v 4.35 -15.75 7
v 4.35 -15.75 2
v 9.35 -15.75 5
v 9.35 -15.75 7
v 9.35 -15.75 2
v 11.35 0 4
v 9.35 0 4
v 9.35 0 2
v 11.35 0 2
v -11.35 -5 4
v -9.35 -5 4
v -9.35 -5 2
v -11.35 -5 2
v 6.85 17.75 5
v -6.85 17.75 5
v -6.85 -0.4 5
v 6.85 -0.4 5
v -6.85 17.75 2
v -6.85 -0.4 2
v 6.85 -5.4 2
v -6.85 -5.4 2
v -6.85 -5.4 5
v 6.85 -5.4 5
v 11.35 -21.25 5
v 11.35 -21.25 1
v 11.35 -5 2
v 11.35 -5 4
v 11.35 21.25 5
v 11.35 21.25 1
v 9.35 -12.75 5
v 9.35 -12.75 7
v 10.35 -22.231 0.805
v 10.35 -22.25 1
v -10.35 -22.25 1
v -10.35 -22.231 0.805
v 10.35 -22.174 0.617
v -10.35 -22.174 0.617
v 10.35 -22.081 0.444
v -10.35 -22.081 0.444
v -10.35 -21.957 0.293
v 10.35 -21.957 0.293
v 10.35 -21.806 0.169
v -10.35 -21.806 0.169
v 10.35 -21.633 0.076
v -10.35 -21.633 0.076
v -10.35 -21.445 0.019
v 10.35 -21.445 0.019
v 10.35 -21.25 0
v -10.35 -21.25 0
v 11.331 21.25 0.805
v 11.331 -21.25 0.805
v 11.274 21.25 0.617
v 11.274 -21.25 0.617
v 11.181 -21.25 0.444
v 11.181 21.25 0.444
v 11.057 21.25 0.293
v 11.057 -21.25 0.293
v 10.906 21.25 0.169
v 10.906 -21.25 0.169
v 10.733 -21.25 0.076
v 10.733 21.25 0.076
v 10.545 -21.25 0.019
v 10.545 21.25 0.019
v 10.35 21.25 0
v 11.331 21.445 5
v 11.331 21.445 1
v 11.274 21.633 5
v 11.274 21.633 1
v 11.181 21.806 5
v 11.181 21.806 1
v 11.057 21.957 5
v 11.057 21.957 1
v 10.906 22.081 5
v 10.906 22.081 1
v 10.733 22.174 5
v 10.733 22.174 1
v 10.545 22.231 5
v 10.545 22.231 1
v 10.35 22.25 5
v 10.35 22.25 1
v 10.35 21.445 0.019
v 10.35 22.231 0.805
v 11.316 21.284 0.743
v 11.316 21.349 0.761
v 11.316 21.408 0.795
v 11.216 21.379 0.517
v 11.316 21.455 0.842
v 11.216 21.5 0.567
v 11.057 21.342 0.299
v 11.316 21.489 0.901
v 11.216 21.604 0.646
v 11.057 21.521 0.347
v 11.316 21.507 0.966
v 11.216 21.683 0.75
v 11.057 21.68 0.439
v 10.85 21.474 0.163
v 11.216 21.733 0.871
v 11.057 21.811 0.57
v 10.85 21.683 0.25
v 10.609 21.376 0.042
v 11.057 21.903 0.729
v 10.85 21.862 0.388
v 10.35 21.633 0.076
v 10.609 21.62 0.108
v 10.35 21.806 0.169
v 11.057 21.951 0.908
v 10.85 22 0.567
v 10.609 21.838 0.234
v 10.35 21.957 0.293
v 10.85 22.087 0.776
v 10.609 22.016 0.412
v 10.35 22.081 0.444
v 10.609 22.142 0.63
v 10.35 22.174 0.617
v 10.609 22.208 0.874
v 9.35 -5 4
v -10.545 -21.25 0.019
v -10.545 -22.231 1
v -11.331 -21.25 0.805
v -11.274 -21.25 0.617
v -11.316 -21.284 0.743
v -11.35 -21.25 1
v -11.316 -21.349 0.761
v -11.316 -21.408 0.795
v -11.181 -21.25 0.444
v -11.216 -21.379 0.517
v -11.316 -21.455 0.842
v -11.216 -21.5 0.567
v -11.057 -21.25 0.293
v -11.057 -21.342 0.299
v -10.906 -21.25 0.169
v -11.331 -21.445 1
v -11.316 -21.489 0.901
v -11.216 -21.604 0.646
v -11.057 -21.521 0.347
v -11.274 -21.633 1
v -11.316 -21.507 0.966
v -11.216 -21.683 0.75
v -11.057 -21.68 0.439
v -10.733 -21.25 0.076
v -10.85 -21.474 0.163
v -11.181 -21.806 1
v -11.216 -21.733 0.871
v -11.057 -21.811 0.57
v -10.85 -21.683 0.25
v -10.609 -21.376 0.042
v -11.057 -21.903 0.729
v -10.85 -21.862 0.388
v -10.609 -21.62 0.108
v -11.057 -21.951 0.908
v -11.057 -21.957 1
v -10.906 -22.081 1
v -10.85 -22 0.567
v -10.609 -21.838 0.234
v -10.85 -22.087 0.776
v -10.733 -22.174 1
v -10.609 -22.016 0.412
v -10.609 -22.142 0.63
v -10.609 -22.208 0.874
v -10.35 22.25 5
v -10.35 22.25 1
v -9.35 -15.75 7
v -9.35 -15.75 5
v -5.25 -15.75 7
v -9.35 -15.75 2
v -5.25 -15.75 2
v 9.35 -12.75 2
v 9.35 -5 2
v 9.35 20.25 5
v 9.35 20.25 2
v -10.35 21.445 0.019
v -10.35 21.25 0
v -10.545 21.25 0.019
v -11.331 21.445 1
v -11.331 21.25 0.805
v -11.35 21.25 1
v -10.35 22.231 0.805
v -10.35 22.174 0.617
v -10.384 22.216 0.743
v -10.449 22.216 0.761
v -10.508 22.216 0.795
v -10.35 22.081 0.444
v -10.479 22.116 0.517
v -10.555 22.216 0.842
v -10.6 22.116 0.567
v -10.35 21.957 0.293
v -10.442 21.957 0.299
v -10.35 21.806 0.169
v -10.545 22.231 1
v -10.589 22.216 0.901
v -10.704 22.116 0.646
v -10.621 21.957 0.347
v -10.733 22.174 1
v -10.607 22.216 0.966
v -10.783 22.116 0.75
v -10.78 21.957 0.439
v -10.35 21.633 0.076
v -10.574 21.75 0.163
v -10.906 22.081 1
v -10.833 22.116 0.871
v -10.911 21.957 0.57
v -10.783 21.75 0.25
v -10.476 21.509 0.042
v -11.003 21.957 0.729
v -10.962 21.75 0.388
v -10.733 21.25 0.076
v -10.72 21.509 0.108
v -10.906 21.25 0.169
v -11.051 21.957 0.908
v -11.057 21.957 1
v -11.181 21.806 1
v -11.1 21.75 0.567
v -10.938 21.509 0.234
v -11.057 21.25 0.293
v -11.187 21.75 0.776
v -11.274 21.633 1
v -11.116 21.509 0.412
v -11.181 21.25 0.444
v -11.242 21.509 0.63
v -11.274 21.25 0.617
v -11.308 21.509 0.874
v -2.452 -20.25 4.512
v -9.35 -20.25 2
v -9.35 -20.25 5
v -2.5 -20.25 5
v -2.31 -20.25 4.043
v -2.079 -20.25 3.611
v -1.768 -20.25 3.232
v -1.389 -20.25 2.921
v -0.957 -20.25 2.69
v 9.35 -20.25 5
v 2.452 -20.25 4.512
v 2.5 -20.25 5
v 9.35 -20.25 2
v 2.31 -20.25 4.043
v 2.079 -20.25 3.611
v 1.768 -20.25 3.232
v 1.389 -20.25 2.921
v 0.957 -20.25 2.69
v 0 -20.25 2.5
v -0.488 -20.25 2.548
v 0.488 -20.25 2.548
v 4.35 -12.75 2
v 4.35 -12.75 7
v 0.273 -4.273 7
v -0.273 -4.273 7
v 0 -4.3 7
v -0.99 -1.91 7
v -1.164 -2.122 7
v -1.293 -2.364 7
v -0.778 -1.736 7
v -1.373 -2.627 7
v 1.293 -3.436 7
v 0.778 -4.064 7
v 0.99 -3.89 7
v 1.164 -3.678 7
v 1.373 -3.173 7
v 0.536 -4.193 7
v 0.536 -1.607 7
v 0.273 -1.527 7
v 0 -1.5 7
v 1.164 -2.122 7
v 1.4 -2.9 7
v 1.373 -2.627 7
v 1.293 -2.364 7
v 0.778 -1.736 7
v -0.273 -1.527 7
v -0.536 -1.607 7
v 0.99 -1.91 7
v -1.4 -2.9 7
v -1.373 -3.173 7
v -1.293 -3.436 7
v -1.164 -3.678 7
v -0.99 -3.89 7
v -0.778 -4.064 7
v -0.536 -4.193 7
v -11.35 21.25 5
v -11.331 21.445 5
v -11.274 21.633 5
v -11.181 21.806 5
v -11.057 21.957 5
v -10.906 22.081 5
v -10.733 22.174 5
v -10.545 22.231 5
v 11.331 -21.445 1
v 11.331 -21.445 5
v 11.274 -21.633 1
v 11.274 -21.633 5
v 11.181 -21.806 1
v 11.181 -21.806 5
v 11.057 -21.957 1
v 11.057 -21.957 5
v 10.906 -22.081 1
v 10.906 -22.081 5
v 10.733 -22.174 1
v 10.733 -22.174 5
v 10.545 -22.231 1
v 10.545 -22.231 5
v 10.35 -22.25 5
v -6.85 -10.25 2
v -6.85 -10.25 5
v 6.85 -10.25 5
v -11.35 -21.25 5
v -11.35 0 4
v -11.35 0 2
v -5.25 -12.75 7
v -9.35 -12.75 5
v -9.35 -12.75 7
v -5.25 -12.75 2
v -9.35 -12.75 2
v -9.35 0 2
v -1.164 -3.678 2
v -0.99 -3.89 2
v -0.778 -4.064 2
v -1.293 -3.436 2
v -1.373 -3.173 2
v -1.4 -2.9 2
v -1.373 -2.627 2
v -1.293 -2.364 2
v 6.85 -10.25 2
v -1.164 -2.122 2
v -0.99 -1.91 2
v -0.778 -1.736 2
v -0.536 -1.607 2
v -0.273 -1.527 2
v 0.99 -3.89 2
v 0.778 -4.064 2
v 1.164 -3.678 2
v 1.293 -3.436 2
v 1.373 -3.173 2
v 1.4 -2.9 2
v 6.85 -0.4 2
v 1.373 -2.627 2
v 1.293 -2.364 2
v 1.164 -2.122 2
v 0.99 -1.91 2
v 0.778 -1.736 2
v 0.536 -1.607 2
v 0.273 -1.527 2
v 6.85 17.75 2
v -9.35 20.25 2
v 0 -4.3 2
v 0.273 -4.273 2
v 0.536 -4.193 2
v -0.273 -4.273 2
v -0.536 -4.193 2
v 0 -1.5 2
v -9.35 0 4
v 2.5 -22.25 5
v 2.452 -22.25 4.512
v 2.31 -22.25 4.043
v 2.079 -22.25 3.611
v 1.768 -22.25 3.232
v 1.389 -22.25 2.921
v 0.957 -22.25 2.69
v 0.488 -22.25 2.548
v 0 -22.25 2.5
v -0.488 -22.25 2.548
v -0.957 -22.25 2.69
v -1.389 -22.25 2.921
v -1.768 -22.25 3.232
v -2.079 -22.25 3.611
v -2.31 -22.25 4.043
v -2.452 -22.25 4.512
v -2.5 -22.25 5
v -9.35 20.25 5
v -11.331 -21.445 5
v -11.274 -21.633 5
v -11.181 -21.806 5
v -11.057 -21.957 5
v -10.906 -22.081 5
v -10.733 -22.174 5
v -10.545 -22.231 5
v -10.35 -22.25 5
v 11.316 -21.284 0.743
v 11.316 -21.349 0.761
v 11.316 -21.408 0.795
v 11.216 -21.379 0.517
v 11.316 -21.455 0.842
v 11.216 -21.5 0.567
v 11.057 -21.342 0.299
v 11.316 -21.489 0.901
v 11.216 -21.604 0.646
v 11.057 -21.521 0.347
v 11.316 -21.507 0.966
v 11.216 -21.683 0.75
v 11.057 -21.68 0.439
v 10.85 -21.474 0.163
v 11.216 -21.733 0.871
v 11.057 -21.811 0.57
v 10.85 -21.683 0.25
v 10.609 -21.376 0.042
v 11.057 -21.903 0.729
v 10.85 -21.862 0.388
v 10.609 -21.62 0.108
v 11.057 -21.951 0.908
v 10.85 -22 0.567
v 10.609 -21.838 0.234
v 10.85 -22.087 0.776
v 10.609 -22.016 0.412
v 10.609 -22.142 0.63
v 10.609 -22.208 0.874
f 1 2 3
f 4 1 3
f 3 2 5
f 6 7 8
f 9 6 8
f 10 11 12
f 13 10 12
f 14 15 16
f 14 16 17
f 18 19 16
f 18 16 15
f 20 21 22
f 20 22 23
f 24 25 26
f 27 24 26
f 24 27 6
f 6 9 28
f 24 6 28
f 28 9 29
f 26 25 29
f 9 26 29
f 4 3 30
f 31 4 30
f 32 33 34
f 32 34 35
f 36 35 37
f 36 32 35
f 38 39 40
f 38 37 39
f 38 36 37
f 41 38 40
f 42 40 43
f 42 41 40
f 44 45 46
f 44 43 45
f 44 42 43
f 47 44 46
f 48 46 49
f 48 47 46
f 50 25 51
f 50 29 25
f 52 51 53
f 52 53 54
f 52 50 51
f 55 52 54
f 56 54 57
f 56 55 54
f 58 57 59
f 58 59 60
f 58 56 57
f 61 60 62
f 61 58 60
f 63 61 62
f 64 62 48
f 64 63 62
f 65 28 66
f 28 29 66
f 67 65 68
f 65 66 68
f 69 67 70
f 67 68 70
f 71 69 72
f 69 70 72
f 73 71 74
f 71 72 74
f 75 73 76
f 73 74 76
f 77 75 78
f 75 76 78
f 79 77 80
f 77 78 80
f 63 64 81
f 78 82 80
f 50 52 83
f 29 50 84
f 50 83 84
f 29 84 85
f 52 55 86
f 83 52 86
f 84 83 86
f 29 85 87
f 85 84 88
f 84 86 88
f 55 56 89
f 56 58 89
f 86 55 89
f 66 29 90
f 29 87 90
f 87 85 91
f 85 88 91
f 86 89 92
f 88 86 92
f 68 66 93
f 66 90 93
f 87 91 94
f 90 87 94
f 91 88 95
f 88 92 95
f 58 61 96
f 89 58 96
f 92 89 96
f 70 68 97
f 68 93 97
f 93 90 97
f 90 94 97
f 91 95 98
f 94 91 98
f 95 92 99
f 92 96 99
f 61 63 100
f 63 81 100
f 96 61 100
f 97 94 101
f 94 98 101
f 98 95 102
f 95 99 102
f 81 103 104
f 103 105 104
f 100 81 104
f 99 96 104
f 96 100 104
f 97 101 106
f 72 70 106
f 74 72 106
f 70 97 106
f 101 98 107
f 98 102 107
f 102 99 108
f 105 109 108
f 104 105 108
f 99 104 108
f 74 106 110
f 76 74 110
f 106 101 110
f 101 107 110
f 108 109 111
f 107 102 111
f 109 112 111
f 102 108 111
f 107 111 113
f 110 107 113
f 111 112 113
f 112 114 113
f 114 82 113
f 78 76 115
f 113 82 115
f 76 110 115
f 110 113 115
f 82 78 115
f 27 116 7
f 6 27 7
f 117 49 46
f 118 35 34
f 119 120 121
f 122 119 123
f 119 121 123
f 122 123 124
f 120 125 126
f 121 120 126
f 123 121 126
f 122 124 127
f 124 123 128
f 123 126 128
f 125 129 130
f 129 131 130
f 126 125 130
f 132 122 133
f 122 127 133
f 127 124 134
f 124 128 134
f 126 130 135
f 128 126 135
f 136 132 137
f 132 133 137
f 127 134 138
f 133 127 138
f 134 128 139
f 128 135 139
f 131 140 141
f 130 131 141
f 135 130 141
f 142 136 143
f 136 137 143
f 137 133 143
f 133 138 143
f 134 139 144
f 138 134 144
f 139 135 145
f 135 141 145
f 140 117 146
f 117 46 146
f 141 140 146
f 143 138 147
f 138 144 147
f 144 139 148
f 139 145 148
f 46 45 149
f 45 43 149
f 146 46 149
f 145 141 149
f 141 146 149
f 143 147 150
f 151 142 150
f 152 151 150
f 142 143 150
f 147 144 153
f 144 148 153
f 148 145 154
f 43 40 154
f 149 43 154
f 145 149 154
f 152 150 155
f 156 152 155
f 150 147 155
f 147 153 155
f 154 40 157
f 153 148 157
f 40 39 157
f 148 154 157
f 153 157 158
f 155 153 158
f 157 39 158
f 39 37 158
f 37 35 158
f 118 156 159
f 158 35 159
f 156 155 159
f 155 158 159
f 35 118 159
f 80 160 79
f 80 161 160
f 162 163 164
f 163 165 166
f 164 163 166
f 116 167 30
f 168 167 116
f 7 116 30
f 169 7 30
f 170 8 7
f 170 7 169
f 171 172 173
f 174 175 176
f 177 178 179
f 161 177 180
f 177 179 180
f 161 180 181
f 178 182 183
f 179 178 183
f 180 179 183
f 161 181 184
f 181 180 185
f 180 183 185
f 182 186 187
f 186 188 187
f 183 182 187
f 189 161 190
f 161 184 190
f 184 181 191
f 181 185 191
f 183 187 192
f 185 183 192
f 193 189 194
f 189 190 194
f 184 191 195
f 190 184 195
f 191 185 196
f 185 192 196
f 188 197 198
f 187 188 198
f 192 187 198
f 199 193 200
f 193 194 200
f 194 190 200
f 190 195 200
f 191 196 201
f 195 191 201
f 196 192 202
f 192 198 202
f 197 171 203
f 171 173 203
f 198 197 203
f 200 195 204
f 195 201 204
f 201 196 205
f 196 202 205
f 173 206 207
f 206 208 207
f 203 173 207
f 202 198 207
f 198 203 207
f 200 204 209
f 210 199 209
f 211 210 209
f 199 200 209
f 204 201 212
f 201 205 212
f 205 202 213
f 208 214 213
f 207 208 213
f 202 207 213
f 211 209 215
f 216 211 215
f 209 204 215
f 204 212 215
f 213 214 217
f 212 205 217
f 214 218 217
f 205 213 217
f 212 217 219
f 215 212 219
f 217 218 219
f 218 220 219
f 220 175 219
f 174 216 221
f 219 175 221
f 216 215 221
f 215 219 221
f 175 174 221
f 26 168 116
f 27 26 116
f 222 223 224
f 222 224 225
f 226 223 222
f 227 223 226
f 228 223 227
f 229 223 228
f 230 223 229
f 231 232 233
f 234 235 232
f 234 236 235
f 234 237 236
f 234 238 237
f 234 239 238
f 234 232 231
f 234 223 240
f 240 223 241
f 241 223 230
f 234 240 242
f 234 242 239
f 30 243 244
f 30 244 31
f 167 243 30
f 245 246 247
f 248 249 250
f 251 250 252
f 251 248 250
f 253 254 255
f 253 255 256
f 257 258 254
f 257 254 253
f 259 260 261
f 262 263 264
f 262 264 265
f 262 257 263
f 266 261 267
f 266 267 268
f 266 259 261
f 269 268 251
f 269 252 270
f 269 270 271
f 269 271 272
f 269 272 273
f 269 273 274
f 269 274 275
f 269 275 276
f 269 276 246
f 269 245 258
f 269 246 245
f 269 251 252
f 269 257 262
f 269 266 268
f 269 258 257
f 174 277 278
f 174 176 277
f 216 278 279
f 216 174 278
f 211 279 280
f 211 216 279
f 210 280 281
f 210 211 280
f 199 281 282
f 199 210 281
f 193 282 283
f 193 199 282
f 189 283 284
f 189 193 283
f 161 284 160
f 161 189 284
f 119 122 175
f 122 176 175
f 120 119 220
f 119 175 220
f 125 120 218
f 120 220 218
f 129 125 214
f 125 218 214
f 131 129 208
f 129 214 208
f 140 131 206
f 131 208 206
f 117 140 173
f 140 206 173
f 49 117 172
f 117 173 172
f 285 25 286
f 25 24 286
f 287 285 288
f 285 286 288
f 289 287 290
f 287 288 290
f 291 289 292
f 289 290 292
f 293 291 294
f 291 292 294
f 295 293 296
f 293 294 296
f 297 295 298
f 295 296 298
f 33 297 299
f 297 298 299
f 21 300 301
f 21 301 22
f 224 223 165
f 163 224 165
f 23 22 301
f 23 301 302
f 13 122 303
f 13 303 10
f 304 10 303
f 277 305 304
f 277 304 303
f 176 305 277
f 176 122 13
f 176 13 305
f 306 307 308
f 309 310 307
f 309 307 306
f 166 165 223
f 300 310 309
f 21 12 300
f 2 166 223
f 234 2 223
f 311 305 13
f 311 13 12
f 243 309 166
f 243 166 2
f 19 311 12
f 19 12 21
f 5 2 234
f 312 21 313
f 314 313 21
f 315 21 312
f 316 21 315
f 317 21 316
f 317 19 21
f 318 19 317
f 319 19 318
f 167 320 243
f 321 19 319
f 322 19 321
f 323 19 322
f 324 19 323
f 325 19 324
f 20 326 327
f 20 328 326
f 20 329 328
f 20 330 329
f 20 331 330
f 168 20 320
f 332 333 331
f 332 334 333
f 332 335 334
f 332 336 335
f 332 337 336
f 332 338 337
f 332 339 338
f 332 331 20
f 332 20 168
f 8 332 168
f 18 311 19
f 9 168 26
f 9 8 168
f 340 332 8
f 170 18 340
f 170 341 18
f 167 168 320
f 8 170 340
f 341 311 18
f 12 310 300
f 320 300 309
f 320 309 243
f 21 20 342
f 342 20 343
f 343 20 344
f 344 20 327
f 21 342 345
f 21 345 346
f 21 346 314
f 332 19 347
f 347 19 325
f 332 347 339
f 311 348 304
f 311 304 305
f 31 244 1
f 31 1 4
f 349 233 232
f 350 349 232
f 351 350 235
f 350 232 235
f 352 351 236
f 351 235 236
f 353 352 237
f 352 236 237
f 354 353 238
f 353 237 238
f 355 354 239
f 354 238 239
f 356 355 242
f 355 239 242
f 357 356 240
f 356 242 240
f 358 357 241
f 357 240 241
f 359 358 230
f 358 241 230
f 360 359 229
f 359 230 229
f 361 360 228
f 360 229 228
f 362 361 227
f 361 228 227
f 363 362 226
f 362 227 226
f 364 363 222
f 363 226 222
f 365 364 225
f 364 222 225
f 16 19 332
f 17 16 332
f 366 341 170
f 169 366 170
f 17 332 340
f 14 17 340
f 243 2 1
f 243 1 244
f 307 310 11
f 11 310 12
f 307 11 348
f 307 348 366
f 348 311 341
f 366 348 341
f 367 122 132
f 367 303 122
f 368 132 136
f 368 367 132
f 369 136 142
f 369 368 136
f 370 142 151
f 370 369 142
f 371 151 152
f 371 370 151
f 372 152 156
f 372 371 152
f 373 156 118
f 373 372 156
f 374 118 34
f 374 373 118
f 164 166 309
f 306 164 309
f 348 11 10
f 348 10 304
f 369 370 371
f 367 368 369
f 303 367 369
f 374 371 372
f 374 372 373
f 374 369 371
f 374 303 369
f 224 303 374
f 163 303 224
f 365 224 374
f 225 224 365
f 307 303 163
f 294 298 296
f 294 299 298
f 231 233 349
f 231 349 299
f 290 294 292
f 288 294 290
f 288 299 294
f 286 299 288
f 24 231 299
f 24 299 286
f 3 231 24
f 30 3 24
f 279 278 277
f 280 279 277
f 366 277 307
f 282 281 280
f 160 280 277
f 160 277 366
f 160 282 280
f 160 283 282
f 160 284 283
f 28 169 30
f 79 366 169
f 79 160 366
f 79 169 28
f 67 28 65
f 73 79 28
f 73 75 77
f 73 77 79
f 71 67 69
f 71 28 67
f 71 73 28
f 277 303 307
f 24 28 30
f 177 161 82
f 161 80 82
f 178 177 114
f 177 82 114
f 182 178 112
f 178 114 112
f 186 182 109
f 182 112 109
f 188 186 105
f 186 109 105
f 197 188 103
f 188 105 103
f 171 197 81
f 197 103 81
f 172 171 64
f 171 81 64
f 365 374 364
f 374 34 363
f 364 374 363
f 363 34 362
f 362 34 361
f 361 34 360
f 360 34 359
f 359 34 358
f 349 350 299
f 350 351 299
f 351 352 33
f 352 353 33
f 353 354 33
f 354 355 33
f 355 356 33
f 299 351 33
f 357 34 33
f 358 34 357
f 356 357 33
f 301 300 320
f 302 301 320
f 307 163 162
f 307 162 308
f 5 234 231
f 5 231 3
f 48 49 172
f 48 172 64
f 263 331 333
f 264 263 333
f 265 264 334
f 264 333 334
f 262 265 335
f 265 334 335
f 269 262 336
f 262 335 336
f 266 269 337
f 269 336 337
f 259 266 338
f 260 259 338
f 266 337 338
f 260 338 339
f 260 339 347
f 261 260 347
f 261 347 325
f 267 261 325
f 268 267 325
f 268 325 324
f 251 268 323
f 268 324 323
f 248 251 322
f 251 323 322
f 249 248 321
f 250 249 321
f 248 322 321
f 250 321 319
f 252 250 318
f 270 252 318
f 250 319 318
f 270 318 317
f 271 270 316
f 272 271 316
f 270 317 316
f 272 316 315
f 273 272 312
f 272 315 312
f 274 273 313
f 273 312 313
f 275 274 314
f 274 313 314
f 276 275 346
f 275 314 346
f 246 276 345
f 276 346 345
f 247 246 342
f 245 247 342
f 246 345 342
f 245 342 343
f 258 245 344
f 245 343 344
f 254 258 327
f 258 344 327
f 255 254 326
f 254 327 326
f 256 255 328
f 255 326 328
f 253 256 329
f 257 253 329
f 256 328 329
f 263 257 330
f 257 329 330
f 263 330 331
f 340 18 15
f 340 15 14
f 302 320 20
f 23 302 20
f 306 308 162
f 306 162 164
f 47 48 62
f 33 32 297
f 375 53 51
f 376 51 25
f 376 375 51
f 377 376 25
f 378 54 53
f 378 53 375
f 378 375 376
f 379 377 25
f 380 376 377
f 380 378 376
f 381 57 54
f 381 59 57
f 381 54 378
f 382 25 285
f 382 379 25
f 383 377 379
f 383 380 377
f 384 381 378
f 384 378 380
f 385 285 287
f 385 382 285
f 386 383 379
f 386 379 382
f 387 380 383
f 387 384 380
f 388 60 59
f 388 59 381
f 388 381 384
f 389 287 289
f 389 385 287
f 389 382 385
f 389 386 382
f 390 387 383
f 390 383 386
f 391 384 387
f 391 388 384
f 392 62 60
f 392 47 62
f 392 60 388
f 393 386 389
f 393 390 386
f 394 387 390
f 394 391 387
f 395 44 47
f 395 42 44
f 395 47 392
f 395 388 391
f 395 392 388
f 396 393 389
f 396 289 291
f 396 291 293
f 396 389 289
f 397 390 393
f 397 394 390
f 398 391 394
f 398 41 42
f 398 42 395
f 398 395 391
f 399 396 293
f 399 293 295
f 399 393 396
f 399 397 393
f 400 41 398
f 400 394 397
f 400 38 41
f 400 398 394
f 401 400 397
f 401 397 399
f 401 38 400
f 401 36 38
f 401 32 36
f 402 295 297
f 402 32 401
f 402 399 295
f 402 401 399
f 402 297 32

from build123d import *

# Parameters (mm, degrees)
SKETCH1_W           = 22.7
SKETCH1_H           = 44.5
BOSS_EXTRUDE1_DEPTH = 2
SKETCH2_W           = 22.7
SKETCH2_H           = 44.5
SKETCH2_W_2         = 18.7
SKETCH2_H_2         = 40.5
BOSS_EXTRUDE2_DEPTH = 3
SKETCH3_W           = 5
SKETCH3_H           = 3
SKETCH3_W_2         = 4.1
SKETCH3_R           = 1.4
BOSS_EXTRUDE3_DEPTH = 5
SKETCH4_W           = 2
SKETCH4_H           = 5
CUT_EXTRUDE1_DEPTH  = 3
CUT_EXTRUDE2_DEPTH  = 3
FILLET2_R           = 1
SKETCH12_W          = 13.7
SKETCH12_H          = 18.15
SKETCH12_H_2        = 4.85
BOSS_EXTRUDE8_DEPTH = 3
CUT_EXTRUDE3_DEPTH  = 3


with BuildPart() as part:
    # Sketch1 → Boss-Extrude1 (new body)
    with BuildSketch(Plane.XY):
        Rectangle(SKETCH1_W, SKETCH1_H)
    extrude(amount=BOSS_EXTRUDE1_DEPTH)

    # Sketch2 → Boss-Extrude2 (add)
    with BuildSketch(Plane.XY.offset(2)):
        Rectangle(SKETCH2_W, SKETCH2_H)
        Rectangle(SKETCH2_W_2, SKETCH2_H_2, mode=Mode.SUBTRACT)
    extrude(amount=BOSS_EXTRUDE2_DEPTH)

    # Sketch3 → Boss-Extrude3 (add)
    with BuildSketch(Plane.XY.offset(2)):
        with Locations((6.85, -14.25)):
            Rectangle(SKETCH3_W, SKETCH3_H)
        with Locations((-7.3, -14.25)):
            Rectangle(SKETCH3_W_2, SKETCH3_H)
        with Locations((0, -2.9)):
            Circle(SKETCH3_R)
    extrude(amount=BOSS_EXTRUDE3_DEPTH)

    # Sketch4 → Cut-Extrude1 (cut, through all)
    with BuildSketch(Plane(origin=(-9.35, 0, 0), x_dir=(0, 0, -1), z_dir=(1, 0, 0))):
        with Locations((-3, -2.5)):
            Rectangle(SKETCH4_W, SKETCH4_H)
    extrude(amount=-CUT_EXTRUDE1_DEPTH, mode=Mode.SUBTRACT)

    # Sketch8 → Cut-Extrude2 (cut, through all)
    with BuildSketch(Plane.ZY.offset(-9.35)):
        Polygon((2, 0), (2, -2.5), (2, -5), (4, -5), (4, -2.5), (4, 0), align=None)
    extrude(amount=-CUT_EXTRUDE2_DEPTH, mode=Mode.SUBTRACT)

    # Fillet2
    fillet2_edges = [part.edges().sort_by_distance(p)[0] for p in [
        (0, -22.25, 0),
        (-11.35, 0, 0),
        (0, 22.25, 0),
        (11.35, 0, 0),
        (11.35, -22.25, 2.5),
        (-11.35, -22.25, 2.5),
        (-11.35, 22.25, 2.5),
        (11.35, 22.25, 2.5),
    ]]
    fillet(fillet2_edges, radius=FILLET2_R)

    # Sketch12 → Boss-Extrude8 (add)
    with BuildSketch(Plane.XY.offset(2)):
        with Locations((0, 8.675)):
            Rectangle(SKETCH12_W, SKETCH12_H)
        with Locations((0, -7.825)):
            Rectangle(SKETCH12_W, SKETCH12_H_2)
    extrude(amount=BOSS_EXTRUDE8_DEPTH)

    # Sketch13 → Cut-Extrude3 (cut, through all)
    with BuildSketch(Plane(origin=(0, -20.25, 0), x_dir=(1, 0, 0), z_dir=(0, 1, 0))):
        with BuildLine():
            Line((-2.5, -5), (2.5, -5))
            ThreePointArc((2.5, -5), (0, -2.5), (-2.5, -5))
        make_face()
    extrude(amount=-CUT_EXTRUDE3_DEPTH, mode=Mode.SUBTRACT)


solid = part.part
